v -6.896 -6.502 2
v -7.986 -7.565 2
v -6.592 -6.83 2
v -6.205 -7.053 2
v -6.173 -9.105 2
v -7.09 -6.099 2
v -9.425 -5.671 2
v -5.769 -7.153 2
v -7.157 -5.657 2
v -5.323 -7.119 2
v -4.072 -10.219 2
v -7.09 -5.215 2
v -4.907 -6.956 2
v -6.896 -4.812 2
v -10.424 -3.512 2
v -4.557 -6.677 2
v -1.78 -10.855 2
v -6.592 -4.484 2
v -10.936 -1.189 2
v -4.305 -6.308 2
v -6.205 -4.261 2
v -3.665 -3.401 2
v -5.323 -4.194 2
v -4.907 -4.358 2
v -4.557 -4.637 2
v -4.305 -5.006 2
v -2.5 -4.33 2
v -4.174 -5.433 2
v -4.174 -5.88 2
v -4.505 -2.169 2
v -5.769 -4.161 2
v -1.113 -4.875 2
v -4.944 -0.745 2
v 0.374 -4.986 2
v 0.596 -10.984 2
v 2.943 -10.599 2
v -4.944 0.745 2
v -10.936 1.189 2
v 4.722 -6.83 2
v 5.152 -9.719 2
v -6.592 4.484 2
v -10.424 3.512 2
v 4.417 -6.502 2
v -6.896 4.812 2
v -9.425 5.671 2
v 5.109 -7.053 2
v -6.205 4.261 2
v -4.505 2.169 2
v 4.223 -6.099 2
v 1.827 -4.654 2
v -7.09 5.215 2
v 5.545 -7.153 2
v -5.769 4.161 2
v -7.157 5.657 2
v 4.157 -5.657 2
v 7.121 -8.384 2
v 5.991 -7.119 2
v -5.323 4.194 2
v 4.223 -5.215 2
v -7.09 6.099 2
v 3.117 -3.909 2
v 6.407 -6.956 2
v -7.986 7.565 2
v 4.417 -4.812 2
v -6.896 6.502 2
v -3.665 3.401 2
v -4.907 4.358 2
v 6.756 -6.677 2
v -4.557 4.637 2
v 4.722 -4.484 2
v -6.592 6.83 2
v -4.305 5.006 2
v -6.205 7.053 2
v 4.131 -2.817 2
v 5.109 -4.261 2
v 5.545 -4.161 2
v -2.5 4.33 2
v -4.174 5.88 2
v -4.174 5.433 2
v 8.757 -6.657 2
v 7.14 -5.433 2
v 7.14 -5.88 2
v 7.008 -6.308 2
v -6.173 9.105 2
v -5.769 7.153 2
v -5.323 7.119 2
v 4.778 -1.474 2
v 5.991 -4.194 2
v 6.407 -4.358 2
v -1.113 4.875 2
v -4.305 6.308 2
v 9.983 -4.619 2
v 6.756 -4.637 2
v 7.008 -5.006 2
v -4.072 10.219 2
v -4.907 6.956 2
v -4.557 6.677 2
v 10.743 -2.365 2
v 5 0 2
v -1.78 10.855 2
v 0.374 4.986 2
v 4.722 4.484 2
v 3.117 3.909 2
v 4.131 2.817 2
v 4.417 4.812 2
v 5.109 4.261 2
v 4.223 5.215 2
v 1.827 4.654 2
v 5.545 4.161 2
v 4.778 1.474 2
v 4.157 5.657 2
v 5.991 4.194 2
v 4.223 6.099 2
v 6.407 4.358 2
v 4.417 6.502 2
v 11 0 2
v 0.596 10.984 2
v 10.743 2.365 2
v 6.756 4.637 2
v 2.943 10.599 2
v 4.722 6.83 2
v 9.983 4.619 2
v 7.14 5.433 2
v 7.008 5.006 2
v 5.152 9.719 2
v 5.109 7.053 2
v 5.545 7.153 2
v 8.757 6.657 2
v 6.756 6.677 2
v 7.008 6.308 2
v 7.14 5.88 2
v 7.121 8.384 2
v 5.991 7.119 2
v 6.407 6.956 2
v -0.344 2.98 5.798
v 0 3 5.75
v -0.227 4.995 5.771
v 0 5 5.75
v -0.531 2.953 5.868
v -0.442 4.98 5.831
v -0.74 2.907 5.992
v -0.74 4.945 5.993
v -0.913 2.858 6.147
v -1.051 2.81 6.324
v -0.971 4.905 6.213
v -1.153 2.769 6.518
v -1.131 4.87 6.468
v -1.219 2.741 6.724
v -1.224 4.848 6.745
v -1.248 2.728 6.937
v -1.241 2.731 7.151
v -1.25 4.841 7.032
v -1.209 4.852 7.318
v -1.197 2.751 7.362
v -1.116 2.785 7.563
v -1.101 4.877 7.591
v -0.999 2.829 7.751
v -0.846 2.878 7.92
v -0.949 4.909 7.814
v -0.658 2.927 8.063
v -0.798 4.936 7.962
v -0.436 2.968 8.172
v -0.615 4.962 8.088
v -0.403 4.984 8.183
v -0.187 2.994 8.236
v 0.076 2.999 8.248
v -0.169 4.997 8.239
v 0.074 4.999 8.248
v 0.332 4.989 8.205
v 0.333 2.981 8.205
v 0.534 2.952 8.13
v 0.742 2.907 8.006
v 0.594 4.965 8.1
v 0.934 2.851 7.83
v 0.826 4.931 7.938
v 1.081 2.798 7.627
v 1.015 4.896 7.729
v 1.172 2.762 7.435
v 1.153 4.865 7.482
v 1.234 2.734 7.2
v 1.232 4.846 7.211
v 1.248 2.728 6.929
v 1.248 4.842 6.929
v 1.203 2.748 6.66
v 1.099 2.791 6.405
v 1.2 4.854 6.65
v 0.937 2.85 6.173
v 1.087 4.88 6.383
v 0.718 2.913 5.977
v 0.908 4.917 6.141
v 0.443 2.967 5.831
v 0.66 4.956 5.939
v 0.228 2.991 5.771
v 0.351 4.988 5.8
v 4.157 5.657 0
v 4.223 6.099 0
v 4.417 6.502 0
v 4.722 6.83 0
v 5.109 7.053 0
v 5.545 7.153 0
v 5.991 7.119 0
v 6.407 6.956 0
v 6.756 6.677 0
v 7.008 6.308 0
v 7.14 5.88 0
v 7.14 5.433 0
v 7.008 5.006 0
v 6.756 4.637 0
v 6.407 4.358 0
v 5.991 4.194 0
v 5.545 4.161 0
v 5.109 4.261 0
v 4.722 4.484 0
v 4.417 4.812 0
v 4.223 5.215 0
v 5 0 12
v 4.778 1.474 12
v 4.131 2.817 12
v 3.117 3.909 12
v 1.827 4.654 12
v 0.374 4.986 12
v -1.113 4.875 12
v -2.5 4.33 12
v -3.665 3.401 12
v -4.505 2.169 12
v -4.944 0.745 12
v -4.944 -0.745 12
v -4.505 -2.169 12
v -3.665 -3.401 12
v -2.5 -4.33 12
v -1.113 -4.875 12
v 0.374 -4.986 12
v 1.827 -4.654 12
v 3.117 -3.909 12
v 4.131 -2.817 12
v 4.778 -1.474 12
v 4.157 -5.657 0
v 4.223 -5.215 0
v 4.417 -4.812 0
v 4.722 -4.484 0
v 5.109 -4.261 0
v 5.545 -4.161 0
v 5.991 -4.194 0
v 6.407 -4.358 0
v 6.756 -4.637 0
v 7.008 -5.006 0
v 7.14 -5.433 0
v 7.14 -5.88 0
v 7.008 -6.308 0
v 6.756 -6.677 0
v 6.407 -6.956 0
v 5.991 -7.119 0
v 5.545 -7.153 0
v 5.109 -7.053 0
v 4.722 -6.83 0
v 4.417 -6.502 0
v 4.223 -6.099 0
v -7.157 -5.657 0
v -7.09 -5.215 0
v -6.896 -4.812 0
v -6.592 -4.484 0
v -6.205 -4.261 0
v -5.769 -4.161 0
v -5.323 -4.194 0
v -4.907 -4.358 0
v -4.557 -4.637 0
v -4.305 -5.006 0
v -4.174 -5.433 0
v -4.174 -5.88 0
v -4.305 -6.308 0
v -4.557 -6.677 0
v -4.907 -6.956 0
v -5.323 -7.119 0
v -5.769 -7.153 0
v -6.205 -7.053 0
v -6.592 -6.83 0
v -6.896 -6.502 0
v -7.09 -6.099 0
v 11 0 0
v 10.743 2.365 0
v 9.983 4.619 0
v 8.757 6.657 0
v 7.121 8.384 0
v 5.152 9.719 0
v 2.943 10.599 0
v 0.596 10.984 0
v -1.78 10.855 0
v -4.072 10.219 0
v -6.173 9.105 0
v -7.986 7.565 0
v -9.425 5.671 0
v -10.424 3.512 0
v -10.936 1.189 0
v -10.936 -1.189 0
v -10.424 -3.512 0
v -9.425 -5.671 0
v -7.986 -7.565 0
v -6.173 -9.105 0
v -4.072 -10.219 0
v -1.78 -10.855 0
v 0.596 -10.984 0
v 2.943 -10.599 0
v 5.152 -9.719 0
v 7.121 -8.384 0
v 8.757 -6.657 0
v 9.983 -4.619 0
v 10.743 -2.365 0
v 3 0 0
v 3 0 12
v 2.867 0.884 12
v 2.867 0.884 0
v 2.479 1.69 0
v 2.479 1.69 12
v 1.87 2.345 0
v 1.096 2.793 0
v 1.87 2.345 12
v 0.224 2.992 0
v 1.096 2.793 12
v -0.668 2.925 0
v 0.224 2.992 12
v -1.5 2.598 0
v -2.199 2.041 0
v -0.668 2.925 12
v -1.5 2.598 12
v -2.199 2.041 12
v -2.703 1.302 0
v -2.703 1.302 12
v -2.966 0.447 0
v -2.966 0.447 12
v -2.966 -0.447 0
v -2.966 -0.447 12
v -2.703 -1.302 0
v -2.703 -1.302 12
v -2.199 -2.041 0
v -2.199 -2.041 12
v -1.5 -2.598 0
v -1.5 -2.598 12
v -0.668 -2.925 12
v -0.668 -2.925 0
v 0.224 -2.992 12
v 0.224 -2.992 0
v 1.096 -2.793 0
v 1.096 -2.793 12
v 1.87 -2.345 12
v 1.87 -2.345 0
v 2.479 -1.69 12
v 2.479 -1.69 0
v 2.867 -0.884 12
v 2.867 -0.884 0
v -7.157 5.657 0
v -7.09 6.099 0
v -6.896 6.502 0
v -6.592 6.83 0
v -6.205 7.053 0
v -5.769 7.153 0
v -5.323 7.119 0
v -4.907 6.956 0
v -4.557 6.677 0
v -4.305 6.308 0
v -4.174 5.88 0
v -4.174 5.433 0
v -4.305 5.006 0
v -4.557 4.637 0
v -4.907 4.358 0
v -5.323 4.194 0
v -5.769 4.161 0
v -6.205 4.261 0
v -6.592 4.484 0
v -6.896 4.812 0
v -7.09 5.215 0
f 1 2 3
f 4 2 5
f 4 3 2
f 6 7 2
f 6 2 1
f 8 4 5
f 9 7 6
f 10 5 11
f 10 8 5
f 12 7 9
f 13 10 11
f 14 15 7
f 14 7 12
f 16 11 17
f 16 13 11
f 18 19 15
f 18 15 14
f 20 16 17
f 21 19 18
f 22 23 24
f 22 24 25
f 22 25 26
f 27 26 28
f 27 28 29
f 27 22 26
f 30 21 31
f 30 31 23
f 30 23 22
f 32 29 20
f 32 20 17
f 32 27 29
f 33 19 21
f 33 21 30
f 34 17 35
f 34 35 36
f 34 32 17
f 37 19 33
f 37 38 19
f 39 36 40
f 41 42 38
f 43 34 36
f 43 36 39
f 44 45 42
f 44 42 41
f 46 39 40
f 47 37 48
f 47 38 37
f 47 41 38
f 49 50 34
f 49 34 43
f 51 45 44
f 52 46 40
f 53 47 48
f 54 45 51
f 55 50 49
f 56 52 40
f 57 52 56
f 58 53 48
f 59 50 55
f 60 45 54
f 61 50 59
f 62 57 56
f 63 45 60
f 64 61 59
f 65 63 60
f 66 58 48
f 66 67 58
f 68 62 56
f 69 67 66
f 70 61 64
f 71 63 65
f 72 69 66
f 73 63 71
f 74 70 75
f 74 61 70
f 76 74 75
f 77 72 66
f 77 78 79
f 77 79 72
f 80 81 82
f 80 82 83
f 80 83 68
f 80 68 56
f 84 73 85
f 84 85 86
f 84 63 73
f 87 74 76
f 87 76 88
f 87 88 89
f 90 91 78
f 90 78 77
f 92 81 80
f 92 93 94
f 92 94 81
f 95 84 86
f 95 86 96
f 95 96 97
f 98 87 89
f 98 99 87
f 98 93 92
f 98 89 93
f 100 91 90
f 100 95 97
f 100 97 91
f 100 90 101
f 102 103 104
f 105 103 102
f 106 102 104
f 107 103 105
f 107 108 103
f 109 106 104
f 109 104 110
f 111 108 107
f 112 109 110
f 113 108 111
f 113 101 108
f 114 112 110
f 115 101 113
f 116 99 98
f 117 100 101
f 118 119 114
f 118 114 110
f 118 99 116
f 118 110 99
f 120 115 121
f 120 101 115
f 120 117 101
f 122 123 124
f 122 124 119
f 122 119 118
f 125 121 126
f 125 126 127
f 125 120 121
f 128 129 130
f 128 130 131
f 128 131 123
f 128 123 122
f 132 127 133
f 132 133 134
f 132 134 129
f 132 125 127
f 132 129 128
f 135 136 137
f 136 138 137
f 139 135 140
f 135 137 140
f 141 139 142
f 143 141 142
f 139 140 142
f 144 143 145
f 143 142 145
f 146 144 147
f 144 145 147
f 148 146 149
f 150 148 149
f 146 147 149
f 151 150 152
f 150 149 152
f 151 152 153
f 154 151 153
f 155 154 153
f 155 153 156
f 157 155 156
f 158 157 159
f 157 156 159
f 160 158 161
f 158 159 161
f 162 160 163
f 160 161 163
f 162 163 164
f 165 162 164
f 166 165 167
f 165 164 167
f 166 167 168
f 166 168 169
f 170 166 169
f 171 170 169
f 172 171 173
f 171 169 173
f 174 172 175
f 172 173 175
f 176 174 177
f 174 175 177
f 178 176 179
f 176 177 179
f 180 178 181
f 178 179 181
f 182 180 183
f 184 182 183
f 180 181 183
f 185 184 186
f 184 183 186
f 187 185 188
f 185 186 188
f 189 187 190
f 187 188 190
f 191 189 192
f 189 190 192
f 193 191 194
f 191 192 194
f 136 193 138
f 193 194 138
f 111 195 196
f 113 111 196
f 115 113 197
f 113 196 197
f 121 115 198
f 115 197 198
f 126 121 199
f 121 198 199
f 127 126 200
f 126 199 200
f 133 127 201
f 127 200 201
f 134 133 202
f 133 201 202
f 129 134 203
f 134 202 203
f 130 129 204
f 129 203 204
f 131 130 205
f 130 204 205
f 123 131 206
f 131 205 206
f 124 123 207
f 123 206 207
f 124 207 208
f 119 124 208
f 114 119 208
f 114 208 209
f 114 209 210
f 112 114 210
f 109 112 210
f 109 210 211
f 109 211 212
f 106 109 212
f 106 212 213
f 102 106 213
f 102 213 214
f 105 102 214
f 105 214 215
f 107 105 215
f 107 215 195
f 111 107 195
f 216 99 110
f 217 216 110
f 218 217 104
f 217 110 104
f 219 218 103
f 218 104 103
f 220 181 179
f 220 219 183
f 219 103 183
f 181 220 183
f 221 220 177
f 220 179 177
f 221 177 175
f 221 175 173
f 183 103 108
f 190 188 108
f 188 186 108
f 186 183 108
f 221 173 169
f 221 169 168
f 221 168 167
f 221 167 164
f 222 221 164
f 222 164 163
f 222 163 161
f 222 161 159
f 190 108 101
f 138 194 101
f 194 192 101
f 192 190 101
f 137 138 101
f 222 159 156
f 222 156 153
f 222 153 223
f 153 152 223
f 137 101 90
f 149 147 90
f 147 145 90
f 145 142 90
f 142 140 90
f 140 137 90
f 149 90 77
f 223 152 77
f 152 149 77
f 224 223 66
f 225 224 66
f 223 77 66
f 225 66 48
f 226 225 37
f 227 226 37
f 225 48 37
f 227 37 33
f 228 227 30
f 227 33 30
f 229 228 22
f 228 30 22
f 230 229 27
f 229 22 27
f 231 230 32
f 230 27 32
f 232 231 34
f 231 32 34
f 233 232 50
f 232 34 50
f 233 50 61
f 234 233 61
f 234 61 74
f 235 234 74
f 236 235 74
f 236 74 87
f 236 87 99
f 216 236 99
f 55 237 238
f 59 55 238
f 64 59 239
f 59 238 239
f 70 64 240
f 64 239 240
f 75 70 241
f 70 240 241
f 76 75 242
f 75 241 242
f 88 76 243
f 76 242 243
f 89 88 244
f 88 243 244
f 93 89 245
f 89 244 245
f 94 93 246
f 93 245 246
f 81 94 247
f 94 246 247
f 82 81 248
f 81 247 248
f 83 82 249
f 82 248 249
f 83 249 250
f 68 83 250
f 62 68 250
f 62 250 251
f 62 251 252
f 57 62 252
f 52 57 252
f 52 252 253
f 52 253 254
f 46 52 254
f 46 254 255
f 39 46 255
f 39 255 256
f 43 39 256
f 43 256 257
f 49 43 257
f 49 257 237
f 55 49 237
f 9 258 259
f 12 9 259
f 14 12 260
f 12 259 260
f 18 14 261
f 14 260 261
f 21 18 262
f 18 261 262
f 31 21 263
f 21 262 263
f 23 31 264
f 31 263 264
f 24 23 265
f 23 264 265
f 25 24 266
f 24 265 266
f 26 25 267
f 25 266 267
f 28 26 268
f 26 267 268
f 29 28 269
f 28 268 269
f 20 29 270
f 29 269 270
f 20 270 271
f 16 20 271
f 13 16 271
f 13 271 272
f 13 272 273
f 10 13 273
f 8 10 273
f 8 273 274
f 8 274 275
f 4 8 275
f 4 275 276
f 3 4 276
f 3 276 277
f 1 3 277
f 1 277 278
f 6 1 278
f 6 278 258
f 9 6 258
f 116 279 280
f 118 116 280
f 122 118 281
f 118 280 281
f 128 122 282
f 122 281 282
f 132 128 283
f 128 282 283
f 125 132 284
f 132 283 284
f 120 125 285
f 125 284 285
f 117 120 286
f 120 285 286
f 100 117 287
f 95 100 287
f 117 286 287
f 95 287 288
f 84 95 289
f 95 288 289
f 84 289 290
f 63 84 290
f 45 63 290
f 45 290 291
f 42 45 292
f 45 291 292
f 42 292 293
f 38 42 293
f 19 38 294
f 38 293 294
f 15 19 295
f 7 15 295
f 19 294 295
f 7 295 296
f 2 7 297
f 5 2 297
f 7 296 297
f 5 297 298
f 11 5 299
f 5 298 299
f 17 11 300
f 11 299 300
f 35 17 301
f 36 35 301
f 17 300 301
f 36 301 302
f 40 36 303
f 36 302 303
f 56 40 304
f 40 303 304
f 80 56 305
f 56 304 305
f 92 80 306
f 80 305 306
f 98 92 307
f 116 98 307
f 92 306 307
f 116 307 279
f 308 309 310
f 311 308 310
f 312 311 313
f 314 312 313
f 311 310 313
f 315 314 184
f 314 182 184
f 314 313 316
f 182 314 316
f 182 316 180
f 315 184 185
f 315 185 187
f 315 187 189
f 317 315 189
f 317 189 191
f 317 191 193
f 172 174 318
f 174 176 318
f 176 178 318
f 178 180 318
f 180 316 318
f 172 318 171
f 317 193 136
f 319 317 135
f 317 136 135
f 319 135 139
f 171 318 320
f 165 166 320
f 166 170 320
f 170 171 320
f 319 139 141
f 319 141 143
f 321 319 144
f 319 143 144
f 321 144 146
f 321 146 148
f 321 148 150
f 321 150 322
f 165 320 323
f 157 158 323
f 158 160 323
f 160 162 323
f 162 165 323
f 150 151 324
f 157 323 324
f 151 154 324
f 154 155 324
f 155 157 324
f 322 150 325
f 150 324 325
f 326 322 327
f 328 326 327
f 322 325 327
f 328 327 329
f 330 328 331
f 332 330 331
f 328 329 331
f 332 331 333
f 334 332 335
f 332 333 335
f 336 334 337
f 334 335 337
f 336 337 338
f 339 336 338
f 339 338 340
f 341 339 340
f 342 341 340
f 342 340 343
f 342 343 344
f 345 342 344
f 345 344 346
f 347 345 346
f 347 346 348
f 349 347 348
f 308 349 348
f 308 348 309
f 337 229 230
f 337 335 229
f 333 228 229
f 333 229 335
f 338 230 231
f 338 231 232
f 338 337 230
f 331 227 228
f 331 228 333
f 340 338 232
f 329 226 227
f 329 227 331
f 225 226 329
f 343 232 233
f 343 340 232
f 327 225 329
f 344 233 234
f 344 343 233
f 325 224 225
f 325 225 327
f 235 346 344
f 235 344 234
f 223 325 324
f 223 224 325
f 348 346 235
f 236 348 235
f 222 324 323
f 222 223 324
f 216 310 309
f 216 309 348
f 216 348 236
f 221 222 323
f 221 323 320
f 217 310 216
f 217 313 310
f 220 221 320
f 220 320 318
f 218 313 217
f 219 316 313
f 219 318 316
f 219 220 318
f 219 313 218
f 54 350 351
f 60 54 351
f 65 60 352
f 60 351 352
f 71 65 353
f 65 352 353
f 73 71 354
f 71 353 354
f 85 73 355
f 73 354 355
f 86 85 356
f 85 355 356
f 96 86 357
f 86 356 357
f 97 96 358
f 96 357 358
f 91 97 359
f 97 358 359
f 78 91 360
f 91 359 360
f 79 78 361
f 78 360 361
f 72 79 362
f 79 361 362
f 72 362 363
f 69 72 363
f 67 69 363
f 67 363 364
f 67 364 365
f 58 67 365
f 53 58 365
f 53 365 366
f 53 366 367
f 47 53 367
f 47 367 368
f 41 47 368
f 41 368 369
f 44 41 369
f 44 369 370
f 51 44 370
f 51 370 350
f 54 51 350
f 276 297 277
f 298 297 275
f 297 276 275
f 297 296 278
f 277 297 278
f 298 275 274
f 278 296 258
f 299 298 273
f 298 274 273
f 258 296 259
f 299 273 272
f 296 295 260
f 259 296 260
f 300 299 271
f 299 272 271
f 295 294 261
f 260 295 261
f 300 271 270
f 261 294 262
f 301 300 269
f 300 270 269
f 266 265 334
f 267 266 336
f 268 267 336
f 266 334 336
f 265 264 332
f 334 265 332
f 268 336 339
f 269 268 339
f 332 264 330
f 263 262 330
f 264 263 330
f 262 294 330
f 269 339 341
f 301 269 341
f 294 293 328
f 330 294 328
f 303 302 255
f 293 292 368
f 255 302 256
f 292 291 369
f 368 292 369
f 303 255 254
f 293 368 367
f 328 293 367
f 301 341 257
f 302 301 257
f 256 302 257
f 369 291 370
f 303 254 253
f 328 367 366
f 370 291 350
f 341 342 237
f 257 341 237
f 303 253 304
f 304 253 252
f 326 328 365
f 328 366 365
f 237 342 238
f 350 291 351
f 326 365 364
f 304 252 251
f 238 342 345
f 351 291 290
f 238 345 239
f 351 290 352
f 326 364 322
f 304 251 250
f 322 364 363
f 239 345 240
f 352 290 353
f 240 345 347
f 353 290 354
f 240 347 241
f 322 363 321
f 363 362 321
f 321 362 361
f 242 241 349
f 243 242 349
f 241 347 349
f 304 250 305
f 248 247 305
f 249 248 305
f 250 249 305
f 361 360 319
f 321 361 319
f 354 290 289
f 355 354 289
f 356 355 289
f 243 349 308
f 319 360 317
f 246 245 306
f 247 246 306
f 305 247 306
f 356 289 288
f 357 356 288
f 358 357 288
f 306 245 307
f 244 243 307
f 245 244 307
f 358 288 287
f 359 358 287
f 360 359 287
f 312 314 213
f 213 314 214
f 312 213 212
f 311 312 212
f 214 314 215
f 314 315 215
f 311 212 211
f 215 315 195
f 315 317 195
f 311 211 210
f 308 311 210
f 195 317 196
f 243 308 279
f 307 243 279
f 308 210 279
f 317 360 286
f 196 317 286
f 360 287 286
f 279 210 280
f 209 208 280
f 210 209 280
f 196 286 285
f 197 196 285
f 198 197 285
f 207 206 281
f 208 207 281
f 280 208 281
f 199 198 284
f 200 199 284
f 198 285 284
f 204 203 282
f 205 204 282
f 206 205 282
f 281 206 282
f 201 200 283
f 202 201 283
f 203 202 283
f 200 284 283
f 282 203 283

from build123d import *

# Parameters (mm, degrees)
SKETCH1_R             = 11
BOSS_EXTRUDE1_DEPTH   = 2
SKETCH2_R             = 5
BOSS_EXTRUDE2_DEPTH   = 10
CUT_EXTRUDE1_REACH    = 21.647
SKETCH3_R             = 3
SKETCH5_W             = 1.25
SKETCH5_H             = 5
F_3_0MM_DOWEL_HOLE1_D = 3


with BuildPart() as part:
    # Sketch1 → Boss-Extrude1 (new body)
    with BuildSketch(Plane.XY):
        Circle(SKETCH1_R)
    extrude(amount=BOSS_EXTRUDE1_DEPTH)

    # Sketch2 → Boss-Extrude2 (add)
    with BuildSketch(Plane.XY.offset(2)):
        Circle(SKETCH2_R)
    extrude(amount=BOSS_EXTRUDE2_DEPTH)

    # Sketch3 → Cut-Extrude1 (cut, up to next)
    with BuildSketch(Plane.XY.offset(12), mode=Mode.PRIVATE) as cut_extrude1_sk1:
        Circle(SKETCH3_R)
    cut_extrude1_tool1 = extrude(cut_extrude1_sk1.sketch, amount=-CUT_EXTRUDE1_REACH, mode=Mode.PRIVATE) & part.part
    add(cut_extrude1_tool1.solids().sort_by_distance((0, 0, 12))[0], mode=Mode.SUBTRACT)

    # Sketch5 → Tap Drill for M3x0.5 Tap1 (revolve, cut)
    with BuildSketch(Plane(origin=(0, 0, 7), x_dir=(0, 0, -1), z_dir=(1, 0, 0))):
        with Locations((0.625, 2.5)):
            Rectangle(SKETCH5_W, SKETCH5_H)
    revolve(axis=Axis((0, -6.35, 7), (0, 1, 0)), mode=Mode.SUBTRACT)

    # Ø3.0mm Dowel Hole1 (through all)
    with Locations(Plane.XY.offset(2)):
        with Locations((5.656854249, 5.656854249), (-5.656854249, -5.656854249), (-5.656854249, 5.656854249), (5.656854249, -5.656854249)):
            Hole(F_3_0MM_DOWEL_HOLE1_D / 2)


solid = part.part
